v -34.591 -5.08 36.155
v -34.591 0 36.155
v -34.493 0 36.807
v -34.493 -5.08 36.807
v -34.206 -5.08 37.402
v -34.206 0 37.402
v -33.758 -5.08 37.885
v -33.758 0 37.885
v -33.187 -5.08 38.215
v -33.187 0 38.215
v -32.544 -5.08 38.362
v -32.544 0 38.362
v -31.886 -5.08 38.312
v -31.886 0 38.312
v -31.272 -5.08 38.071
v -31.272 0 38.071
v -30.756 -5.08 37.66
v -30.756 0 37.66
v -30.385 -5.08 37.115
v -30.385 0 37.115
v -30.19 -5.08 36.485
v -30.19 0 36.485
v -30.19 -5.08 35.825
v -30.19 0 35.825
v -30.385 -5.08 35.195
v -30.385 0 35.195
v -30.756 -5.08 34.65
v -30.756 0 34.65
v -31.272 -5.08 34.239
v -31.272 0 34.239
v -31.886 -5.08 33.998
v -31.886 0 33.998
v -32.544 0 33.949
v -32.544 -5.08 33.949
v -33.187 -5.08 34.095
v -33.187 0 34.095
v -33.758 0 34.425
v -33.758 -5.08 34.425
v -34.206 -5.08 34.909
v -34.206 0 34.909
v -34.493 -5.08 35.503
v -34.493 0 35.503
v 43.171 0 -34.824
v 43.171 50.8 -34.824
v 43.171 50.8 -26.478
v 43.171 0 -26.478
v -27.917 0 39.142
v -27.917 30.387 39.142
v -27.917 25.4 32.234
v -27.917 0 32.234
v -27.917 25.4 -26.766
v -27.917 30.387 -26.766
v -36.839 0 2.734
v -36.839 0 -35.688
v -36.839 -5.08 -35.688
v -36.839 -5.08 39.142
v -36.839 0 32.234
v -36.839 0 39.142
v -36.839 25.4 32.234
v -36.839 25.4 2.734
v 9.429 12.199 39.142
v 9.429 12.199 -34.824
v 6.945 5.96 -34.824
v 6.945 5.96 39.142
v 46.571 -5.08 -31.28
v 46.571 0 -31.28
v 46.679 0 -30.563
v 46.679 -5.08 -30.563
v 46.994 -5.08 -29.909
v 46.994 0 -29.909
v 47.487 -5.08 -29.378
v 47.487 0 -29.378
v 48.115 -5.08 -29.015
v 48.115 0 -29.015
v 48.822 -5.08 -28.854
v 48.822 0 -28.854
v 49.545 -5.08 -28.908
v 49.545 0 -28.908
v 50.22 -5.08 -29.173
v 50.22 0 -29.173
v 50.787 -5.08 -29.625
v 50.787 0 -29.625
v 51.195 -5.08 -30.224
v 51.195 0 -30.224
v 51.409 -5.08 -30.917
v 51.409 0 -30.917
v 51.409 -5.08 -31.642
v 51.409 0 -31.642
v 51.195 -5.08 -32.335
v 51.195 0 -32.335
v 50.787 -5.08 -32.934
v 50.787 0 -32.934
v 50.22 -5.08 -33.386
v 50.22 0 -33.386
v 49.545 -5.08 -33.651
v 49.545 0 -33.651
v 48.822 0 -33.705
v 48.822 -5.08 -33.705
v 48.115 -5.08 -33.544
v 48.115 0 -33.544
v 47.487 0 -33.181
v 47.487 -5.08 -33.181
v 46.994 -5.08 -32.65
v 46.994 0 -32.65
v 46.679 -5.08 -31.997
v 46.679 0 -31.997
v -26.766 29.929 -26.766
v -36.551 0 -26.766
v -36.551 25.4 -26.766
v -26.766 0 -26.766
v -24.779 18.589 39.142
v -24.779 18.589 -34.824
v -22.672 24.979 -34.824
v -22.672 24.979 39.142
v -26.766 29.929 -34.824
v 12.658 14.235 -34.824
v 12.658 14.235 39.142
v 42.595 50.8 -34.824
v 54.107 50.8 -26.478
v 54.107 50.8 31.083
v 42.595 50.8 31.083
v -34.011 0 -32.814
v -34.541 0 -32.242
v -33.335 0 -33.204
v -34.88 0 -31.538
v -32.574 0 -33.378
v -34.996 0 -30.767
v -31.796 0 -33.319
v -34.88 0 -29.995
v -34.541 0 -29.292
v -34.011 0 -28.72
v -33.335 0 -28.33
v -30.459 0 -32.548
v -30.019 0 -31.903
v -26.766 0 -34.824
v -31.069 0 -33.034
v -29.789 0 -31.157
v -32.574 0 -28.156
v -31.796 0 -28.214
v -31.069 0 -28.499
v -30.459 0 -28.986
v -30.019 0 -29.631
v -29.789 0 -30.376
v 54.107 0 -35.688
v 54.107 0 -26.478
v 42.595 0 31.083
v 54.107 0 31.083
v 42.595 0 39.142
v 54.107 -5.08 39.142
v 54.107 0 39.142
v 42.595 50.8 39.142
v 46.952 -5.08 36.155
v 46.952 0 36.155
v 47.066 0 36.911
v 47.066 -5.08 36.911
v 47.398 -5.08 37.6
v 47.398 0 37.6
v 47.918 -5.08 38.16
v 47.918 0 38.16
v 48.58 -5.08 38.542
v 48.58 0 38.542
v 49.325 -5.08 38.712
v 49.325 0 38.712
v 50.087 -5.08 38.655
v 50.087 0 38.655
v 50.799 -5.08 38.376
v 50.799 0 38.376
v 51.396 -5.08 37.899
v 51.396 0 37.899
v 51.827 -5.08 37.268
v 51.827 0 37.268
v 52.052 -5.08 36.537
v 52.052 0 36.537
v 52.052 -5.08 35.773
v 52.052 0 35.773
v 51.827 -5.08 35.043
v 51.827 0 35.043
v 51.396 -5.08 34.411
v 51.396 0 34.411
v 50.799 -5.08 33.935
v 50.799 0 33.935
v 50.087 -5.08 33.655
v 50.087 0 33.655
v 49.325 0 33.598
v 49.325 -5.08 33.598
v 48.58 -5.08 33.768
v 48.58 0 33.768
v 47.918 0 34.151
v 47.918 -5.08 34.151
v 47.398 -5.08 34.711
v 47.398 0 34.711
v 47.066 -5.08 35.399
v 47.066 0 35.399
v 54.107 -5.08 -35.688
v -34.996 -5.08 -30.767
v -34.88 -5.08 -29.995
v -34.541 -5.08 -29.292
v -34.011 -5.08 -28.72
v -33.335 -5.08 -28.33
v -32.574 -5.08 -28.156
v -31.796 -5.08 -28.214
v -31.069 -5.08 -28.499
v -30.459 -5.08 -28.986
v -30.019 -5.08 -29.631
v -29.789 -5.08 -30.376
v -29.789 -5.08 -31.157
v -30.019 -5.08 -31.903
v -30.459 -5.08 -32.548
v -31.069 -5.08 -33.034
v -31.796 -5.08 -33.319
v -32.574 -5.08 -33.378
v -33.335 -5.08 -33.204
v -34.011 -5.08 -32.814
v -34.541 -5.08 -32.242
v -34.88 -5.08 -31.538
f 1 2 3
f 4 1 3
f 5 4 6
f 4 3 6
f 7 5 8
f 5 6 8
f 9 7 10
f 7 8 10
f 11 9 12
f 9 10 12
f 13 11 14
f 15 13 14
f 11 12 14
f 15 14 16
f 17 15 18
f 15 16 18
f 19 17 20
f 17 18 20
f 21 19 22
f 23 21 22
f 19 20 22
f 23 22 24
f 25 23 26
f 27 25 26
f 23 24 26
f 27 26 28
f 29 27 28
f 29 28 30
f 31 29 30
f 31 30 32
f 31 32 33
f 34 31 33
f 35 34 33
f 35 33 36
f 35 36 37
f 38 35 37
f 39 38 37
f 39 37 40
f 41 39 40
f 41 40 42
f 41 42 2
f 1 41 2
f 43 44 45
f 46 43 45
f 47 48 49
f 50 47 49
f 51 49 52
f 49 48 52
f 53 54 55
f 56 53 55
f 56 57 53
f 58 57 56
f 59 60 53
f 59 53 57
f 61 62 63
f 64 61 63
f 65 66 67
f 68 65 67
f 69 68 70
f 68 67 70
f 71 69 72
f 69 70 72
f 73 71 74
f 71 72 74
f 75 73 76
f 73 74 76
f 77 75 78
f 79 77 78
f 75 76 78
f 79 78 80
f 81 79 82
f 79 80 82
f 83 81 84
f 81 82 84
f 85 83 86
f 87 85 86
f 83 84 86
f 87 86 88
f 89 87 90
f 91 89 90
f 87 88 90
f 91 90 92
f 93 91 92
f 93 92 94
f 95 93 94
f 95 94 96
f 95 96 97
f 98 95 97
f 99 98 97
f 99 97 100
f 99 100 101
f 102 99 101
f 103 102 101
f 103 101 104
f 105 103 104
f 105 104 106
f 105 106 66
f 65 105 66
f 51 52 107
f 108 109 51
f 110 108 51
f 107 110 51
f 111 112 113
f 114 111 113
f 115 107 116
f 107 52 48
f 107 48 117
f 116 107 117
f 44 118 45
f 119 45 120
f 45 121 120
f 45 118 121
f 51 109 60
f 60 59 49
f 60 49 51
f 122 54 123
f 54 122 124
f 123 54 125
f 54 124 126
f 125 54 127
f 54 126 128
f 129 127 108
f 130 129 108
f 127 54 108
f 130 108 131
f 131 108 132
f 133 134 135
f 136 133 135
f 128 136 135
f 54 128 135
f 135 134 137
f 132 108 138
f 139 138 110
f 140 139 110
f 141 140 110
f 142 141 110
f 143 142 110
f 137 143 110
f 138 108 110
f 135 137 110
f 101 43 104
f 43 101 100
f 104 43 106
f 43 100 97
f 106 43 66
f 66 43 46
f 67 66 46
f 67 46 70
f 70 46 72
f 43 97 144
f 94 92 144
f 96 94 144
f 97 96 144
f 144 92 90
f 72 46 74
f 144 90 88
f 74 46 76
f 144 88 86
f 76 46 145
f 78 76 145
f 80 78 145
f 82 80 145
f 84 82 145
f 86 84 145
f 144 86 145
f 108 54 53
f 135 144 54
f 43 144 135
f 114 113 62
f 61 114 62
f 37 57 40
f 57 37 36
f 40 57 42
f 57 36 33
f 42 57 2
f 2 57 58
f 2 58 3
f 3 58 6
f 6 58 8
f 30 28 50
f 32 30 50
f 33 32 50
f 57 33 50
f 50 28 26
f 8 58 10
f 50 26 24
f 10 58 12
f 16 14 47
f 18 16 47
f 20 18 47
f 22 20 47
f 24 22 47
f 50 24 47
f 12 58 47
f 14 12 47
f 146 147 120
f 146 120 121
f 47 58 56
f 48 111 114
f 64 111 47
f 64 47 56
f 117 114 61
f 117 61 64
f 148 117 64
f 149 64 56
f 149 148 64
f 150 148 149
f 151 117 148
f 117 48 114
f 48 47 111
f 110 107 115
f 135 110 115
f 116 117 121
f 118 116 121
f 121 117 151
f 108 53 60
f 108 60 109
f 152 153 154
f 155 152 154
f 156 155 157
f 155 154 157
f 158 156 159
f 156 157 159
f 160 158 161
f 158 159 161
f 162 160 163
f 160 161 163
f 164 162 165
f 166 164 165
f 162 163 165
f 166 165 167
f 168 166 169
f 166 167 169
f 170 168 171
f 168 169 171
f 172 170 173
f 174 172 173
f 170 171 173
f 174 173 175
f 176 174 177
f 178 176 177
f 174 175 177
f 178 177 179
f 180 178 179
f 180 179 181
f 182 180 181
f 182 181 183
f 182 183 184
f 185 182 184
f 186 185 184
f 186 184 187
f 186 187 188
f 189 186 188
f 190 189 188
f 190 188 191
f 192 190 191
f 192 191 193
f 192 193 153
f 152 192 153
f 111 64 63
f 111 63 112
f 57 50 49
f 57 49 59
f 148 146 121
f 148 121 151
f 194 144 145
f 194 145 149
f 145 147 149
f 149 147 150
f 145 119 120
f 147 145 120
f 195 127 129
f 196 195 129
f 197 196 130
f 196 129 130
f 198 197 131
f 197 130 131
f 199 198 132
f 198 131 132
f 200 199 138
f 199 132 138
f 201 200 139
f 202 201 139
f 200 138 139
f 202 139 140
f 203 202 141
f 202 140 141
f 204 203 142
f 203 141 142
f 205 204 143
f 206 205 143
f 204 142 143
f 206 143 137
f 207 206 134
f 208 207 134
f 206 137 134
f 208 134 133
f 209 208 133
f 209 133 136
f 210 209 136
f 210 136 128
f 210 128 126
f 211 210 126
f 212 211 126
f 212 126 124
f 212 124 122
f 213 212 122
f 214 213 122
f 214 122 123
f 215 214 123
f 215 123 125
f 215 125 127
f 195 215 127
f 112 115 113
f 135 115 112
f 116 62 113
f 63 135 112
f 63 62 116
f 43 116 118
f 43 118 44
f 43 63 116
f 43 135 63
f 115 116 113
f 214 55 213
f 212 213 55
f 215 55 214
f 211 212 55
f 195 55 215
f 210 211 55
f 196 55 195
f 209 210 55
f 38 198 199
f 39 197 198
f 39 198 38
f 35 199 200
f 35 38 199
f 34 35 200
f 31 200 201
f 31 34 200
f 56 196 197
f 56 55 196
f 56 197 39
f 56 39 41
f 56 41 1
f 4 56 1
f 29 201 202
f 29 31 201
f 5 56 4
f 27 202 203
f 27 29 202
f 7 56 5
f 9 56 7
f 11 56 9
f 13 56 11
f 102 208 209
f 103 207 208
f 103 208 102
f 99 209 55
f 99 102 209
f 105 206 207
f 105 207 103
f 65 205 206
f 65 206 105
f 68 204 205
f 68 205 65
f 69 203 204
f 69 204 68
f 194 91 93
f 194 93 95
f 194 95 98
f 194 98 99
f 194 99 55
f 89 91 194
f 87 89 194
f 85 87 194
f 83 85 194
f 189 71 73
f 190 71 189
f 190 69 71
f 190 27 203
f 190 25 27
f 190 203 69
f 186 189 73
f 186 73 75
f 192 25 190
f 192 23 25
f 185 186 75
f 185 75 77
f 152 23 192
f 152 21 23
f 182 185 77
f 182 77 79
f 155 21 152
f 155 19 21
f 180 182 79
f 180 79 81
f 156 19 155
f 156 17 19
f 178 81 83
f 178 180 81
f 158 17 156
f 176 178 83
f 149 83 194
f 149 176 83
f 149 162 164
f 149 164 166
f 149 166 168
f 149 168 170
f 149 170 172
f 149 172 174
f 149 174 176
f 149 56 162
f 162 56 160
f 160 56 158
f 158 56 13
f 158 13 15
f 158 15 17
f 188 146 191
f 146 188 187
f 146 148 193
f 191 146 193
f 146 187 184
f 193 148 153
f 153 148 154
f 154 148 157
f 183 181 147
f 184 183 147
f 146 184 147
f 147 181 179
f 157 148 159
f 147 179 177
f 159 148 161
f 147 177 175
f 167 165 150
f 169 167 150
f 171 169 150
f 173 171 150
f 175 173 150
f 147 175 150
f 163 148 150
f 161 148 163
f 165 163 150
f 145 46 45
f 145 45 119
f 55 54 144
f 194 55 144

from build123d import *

# Parameters (mm, degrees)
F0_W      = 90.9466184676
F0_H      = 74.8294964433
F2_DEPTH  = 5.08
F3_DEPTH  = 50.8
F5_DEPTH  = 76.2
F6_DEPTH  = 25.4
F8_DEPTH  = 101.6
F9_R      = 2.2127457179
F9_R_2    = 2.6181554233
F9_R_3    = 2.4324763665
F9_R_4    = 2.5640554726
F10_DEPTH = 25.4


with BuildPart() as f2:
    # F0 (on Front) → F2 (new body)
    with BuildSketch(Plane.XZ):
        with Locations((8.6341705173, 1.7268359661)):
            Rectangle(F0_W, F0_H)
    extrude(amount=F2_DEPTH)

    # F1 (on face) → F3 (join)
    with BuildSketch(Plane.XZ):
        Polygon((-27.9171578586, 32.2342440486), (-36.8391387165, 32.2342440486), (-36.8391387165, 2.734344452), (-36.5513302386, -26.7659369856), (-26.765935123, -26.7659369856), (-26.765935123, -34.8244979978), (43.1708656251, -34.8244979978), (43.1708656251, -26.4781285077), (54.1074797511, -26.4781285077), (54.1074797511, 31.0830231756), (42.5952523947, 31.0830231756), (42.5952523947, 39.1415841877), (-27.9171578586, 39.1415841877), align=None)
    extrude(amount=-F3_DEPTH)

    # F4 (on face) → F5 (cut)
    with BuildSketch(Plane.XY.offset(39.1415841877)):
        Polygon((-27.9171578586, 50.8), (-27.9171578586, 30.387243256), (12.6576088369, 14.234690927), (42.5952523947, 50.8), align=None)
    extrude(amount=-F5_DEPTH, mode=Mode.SUBTRACT)

    # F6 (cut): a face of the model
    f6_faces = [f2.faces().sort_by_distance(p)[0] for p in [
        (-32.3426594813, 50.8, 2.8940476275),
    ]]
    extrude(f6_faces, amount=-F6_DEPTH, mode=Mode.SUBTRACT)

    # F7 (on face) → F8 (cut)
    with BuildSketch(Plane(origin=(0, 0, -34.8244979978), x_dir=(1, 0, 0), z_dir=(0, 0, -1))):
        Polygon((-24.7789256071, -18.5888221988), (-22.6721912622, -24.9785389751), (9.4293939445, -12.1991054226), (6.9454660549, -5.9595469581), align=None)
    extrude(amount=-F8_DEPTH, mode=Mode.SUBTRACT)

    # F9 (on face) → F10 (cut)
    with BuildSketch(Plane(origin=(0, 0, 0), x_dir=(-1, 0, 0), z_dir=(0, 1, 0))):
        with Locations((32.3781482875, 36.15520522)):
            Circle(F9_R)
        with Locations((32.3781482875, -30.7667031884)):
            Circle(F9_R_2)
        with Locations((-49.00373891, -31.279515475)):
            Circle(F9_R_3)
        with Locations((-49.5165549219, 36.15520522)):
            Circle(F9_R_4)
    extrude(amount=-F10_DEPTH, mode=Mode.SUBTRACT)


solid = f2.part
